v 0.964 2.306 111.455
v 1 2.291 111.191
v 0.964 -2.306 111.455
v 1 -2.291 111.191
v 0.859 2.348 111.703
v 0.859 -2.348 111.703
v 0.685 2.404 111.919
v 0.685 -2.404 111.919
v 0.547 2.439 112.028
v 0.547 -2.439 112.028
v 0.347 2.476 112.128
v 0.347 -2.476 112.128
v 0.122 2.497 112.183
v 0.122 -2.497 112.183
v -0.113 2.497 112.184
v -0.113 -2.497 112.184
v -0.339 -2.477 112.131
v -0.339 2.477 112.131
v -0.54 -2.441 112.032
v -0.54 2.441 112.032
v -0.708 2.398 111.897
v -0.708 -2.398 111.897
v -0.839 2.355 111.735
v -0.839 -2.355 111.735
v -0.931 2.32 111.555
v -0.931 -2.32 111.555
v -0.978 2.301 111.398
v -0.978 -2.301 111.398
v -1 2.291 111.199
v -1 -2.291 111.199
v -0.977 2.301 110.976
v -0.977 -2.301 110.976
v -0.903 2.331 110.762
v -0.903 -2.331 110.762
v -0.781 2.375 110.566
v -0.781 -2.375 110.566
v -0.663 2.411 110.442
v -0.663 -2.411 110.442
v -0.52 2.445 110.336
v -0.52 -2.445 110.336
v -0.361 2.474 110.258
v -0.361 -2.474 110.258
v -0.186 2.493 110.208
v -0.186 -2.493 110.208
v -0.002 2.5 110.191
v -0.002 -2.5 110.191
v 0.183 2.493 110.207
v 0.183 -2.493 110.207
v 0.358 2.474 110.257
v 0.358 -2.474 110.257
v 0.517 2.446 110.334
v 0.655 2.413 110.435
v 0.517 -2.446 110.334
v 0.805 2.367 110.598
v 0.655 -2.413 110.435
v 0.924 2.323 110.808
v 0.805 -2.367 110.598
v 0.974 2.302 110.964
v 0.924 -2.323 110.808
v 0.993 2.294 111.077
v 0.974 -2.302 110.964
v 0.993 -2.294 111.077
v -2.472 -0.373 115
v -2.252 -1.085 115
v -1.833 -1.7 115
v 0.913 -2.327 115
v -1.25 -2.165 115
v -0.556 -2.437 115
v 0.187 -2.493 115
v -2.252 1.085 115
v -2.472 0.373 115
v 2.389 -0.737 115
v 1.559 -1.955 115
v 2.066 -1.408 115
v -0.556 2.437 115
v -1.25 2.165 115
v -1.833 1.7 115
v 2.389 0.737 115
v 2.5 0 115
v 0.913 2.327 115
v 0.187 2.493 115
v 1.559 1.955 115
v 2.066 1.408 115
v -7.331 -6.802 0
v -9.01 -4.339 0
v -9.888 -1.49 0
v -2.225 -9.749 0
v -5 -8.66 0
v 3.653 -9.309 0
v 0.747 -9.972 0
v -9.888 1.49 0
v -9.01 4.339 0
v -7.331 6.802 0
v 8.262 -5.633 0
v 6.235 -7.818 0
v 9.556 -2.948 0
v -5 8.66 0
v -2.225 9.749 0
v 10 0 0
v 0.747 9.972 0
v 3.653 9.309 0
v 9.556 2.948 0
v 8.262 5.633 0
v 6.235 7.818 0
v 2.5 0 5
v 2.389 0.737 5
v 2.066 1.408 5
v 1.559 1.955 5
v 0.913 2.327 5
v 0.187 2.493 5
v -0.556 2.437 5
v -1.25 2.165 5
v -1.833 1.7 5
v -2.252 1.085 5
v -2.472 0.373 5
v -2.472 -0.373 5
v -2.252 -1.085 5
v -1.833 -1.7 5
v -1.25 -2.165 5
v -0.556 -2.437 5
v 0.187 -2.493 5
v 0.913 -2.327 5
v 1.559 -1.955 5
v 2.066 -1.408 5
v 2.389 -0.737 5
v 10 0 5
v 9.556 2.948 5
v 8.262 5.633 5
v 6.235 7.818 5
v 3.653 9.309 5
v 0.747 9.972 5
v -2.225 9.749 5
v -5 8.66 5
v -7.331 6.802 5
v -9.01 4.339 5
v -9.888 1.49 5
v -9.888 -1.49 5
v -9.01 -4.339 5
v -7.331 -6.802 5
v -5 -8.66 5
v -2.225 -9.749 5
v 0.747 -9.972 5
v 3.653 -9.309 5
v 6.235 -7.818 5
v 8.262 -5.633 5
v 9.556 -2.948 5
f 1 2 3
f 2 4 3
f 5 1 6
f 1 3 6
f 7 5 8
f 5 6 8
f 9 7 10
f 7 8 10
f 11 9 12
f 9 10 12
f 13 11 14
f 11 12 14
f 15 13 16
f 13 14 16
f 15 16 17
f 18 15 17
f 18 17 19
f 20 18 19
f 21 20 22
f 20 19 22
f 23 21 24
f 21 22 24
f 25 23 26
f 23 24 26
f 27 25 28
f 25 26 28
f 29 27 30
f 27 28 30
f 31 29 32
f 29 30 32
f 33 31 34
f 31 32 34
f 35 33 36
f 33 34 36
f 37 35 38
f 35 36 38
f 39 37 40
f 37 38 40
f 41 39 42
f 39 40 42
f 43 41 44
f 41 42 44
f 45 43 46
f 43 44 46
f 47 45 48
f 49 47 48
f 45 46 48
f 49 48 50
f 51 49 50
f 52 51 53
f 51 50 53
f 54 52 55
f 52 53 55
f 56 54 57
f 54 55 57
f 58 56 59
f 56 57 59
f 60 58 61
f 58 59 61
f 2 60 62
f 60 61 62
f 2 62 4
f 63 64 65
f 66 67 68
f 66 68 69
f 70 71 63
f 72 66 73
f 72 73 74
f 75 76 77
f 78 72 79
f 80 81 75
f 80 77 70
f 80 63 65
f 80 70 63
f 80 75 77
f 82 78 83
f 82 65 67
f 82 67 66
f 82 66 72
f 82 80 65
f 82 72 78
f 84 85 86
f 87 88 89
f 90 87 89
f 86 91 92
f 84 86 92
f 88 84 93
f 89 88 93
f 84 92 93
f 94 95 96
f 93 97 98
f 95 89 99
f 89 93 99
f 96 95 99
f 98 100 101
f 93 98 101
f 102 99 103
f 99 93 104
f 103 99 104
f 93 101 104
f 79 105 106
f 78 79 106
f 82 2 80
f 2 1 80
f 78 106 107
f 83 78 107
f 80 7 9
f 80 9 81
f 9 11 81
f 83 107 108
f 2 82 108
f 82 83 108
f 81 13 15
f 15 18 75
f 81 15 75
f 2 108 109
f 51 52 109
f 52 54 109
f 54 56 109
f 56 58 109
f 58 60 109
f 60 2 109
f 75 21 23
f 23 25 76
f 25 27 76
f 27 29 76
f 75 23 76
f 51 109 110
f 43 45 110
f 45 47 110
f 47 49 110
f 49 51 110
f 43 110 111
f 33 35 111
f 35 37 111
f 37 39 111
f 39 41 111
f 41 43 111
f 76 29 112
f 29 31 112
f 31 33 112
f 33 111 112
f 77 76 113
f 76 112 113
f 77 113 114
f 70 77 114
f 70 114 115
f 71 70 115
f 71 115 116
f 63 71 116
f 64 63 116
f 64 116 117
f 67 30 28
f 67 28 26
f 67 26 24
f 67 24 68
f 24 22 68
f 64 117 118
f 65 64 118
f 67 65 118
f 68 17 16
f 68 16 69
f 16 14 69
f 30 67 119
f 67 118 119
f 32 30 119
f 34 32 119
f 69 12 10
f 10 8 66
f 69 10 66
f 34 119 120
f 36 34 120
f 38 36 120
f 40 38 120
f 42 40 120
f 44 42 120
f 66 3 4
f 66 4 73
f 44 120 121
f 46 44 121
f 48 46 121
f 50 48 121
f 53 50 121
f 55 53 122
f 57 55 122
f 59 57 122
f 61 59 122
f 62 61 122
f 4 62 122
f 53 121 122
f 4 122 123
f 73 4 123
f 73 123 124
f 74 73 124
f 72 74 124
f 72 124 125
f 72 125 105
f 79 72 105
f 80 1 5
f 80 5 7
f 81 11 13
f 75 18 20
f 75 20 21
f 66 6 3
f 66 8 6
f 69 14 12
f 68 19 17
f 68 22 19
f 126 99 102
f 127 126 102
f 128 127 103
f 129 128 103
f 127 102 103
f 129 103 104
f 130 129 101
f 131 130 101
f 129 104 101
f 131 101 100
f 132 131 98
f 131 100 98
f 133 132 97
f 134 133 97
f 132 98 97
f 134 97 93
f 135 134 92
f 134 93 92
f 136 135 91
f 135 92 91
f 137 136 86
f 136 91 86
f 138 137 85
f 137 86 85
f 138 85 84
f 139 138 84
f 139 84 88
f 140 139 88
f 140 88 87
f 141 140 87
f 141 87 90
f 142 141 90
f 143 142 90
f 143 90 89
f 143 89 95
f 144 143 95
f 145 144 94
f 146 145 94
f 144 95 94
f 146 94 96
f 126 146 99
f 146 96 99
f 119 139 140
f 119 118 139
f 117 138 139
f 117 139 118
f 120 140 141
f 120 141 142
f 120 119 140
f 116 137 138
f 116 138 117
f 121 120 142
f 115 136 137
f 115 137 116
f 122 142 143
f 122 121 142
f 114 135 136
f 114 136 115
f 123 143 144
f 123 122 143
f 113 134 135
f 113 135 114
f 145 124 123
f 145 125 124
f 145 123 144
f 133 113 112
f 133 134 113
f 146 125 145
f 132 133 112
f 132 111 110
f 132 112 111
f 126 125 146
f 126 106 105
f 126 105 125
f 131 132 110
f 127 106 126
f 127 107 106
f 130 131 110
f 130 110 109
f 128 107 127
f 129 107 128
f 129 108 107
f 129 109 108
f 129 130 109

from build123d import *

# Parameters (mm, degrees)
F0_R     = 2.5
F1_DEPTH = 115
F0_R_2   = 10
F2_DEPTH = 5
F3_R     = 1
F4_DEPTH = 5


with BuildPart() as f1:
    # F0 (on Top) → F1 (new body)
    with BuildSketch(Plane.XY):
        Circle(F0_R)
    extrude(amount=F1_DEPTH)

    # F0 (on Top) → F2 (join)
    with BuildSketch(Plane.XY):
        Circle(F0_R_2)
        Circle(F0_R, mode=Mode.SUBTRACT)
    extrude(amount=F2_DEPTH)

    # F3 (on Front) → F4 (cut, symmetric)
    with BuildSketch(Plane.XZ):
        with Locations((0, 111.190595)):
            Circle(F3_R)
    extrude(amount=F4_DEPTH, both=True, mode=Mode.SUBTRACT)


solid = f1.part
